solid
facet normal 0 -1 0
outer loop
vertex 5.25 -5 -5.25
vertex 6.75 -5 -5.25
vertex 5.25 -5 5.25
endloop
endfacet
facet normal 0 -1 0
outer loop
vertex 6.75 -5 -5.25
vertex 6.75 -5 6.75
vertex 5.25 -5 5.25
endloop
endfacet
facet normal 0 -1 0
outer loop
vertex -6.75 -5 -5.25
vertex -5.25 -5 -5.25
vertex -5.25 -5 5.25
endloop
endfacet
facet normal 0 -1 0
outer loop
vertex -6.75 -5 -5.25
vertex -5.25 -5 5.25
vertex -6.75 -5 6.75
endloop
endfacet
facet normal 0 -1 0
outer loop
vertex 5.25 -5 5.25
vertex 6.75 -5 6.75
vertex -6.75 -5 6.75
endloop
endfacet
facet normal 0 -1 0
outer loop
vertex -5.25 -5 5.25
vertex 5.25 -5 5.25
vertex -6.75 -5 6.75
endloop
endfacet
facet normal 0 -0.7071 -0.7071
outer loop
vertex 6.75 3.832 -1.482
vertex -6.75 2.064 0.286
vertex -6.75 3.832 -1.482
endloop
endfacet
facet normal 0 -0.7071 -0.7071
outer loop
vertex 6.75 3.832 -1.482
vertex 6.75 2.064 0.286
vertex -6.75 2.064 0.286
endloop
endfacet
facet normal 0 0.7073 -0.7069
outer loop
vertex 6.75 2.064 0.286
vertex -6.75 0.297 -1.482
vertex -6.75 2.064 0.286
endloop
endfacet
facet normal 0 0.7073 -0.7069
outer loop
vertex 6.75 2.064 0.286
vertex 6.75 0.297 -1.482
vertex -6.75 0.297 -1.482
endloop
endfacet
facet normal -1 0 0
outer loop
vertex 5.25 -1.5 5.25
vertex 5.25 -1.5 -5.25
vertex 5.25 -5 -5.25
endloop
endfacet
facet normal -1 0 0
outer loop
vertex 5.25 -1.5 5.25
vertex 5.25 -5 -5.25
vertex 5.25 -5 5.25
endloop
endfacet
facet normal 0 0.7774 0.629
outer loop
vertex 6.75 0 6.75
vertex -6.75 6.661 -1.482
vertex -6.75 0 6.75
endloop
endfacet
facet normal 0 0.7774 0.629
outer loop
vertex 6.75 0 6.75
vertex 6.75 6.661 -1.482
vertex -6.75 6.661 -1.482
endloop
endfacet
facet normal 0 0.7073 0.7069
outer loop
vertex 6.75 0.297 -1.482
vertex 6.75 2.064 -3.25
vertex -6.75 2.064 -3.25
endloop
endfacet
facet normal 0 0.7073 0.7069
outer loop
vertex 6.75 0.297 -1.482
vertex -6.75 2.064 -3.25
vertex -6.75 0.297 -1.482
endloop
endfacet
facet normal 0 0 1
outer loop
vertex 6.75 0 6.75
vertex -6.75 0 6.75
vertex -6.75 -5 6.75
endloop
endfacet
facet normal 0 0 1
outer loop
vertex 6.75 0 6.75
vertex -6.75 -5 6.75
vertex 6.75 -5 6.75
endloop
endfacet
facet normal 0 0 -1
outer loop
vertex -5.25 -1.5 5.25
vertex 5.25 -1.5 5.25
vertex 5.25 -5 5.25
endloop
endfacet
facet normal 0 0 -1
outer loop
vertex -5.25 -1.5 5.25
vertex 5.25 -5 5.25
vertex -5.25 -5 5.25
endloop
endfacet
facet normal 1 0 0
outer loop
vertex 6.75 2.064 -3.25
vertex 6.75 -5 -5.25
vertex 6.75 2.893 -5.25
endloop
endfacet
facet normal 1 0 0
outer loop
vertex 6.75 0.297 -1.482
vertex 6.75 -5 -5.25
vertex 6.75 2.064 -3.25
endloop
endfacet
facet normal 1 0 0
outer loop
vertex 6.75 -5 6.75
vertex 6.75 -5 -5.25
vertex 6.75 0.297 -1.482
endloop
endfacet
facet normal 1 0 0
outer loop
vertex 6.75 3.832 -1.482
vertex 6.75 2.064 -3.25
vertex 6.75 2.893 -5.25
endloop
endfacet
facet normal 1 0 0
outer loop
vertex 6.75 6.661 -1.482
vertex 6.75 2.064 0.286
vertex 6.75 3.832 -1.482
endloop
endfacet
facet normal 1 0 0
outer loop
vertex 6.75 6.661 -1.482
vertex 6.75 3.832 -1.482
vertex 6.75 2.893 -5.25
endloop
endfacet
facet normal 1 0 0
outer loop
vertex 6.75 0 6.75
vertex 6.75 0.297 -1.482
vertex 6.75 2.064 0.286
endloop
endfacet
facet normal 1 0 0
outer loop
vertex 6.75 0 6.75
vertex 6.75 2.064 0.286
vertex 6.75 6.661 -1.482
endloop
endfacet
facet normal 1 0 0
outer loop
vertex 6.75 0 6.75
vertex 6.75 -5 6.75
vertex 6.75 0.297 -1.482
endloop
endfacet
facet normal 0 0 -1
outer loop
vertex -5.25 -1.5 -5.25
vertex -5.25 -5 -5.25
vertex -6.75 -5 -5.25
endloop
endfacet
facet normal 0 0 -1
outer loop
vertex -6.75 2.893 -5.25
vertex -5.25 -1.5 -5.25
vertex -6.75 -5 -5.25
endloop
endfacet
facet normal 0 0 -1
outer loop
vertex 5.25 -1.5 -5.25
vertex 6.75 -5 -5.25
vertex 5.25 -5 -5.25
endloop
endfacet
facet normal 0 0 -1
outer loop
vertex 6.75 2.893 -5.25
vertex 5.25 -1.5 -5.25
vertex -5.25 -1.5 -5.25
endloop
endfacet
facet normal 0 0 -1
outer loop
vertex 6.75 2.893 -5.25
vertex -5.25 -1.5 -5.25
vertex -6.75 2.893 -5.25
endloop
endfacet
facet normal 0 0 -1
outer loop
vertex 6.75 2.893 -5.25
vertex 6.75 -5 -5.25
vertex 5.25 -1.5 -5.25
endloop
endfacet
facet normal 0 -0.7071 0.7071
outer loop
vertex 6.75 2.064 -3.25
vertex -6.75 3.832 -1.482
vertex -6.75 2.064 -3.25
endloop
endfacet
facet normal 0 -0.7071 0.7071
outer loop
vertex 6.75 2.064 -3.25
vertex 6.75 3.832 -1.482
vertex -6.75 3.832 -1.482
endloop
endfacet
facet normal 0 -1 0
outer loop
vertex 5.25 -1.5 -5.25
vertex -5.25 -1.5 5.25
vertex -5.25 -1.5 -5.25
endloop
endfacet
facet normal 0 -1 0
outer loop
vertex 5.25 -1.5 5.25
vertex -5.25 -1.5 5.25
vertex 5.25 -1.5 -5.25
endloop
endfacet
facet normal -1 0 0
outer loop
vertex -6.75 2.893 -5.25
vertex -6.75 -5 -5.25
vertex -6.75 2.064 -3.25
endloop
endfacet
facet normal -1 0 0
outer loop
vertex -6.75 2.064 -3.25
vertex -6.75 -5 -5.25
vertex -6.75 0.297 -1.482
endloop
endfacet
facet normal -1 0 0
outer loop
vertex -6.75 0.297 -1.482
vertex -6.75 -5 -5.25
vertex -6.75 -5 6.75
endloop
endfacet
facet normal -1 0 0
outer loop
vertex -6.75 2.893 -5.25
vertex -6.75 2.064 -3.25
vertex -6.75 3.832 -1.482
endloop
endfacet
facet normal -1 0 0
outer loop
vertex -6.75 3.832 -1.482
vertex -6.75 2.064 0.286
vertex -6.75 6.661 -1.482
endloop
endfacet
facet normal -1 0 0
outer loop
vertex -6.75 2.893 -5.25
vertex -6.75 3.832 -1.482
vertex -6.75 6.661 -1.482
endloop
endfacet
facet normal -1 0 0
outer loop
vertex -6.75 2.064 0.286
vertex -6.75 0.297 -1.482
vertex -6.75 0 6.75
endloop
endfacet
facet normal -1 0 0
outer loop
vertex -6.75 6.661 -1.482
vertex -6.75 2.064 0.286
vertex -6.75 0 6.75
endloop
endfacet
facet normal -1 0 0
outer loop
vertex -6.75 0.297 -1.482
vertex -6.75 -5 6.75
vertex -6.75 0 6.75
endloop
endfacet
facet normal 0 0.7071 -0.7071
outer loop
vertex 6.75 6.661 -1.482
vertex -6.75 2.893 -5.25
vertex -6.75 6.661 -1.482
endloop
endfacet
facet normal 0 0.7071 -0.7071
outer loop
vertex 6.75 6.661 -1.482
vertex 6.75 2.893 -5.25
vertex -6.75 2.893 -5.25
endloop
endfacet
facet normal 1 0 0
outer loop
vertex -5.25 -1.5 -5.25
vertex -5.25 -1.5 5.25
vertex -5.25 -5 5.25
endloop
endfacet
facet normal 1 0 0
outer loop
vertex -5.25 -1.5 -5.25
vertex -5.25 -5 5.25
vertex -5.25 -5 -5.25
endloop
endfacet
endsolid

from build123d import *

# Parameters (mm, degrees)
F0_W          = 10.5
F0_H          = 10.5
F1_DEPTH      = 1.5
F3_DEPTH      = 5
F5_DEPTH      = 6.75
F5_DEPTH_BACK = 6.75


# Not quite as in the source:
# - an extrude ends at something that could not be found from the text; its depth is read off the source's solid


with BuildPart() as f1:
    # F0 (on Front) → F1 (new body)
    with BuildSketch(Plane.XZ):
        Rectangle(F0_W, F0_H)
    extrude(amount=F1_DEPTH)

    # F2 (on face) → F3 (join)
    with BuildSketch(Plane(origin=(0, 0, 0), x_dir=(-1, 0, 0), z_dir=(0, 1, 0))):
        Polygon((-6.75, -5.25), (-5.25, -5.25), (-5.25, 5.25), (5.25, 5.25), (5.25, -5.25), (6.75, -5.25), (6.75, 6.75), (-6.75, 6.75), align=None)
    extrude(amount=-F3_DEPTH)

    # F4 (on Right) → F5 (join, two sides)
    with BuildSketch(Plane.YZ) as f5_sk:
        Polygon((0, 6.75), (0, -5.25), (2.8927646712, -5.25), (6.6605316242, -1.482233047), align=None)
        Polygon((2.0643375465, -3.25), (0.2965705935, -1.482233047), (2.0643375465, 0.2855339059), (3.8321044994, -1.482233047), align=None, mode=Mode.SUBTRACT)
    extrude(amount=F5_DEPTH)
    extrude(f5_sk.sketch, amount=-F5_DEPTH_BACK)


solid = f1.part
